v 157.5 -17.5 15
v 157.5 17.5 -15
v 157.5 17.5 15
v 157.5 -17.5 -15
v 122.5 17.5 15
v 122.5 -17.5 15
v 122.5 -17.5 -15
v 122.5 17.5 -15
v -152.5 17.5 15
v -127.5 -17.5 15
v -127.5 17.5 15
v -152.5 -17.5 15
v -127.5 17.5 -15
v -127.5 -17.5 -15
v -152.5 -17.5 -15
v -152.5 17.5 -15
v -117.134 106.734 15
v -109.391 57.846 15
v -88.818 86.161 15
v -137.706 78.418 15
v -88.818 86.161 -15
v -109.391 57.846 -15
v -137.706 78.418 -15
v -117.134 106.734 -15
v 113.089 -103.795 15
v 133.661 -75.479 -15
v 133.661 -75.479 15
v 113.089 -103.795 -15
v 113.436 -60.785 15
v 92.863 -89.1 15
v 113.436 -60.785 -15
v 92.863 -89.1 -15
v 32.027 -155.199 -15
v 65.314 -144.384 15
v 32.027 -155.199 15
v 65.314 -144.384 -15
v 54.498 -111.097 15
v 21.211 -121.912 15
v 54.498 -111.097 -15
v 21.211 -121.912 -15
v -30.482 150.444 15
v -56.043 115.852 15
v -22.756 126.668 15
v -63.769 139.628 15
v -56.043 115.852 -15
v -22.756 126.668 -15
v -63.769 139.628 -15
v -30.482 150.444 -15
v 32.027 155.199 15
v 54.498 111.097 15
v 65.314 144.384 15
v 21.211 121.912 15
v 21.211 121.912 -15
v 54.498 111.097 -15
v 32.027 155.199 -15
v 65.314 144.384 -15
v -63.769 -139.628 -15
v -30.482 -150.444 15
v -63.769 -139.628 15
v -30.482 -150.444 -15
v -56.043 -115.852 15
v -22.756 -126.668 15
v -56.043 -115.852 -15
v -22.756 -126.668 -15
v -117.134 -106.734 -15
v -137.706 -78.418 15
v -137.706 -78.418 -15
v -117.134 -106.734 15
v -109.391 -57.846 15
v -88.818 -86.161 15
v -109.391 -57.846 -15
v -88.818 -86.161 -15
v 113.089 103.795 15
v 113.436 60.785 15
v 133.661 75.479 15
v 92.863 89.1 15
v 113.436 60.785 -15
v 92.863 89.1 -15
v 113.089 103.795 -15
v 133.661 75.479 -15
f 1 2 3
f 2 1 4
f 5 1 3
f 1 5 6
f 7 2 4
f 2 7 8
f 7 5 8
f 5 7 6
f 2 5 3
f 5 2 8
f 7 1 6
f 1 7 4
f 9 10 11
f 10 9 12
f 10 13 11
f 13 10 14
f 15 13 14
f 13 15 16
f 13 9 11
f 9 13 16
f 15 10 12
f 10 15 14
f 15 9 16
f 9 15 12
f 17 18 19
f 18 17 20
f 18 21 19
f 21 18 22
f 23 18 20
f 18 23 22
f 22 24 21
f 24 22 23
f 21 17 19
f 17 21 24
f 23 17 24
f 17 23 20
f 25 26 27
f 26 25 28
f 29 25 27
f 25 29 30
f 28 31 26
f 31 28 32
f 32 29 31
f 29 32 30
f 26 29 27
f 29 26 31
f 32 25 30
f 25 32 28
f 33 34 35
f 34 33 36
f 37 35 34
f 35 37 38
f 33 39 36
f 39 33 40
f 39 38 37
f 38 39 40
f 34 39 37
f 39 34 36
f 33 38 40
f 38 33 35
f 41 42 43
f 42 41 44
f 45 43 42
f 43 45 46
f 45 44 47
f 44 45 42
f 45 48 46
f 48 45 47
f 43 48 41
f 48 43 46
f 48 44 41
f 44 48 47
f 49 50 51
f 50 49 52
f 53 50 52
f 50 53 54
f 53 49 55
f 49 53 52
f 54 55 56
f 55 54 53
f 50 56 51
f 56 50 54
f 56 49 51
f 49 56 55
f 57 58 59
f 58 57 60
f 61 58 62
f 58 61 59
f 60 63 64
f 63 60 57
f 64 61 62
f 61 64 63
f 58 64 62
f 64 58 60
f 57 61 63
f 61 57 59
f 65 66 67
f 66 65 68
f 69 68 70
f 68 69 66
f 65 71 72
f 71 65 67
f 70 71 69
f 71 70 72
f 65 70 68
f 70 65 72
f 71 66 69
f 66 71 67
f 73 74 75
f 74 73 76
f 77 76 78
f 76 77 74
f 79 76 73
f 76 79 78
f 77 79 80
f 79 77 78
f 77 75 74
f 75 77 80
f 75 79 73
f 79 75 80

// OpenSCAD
golden_ratio = (1+sqrt(5))/2;

BaseWidth = 200;
ChamberWidth=BaseWidth/2.62;
BasePlateThickness=3;
WallWidth=3;
WallHeight=20;
Dihedral_angle=116.56505;

module Penta_part(r,h) {
polyhedron(
	points=[
		[0,0,0],
		[sin(72*0)*r, cos(72*0)*r, 0],
		[sin(72*1)*r, cos(72*1)*r, 0],
		[0,0,h],
		[sin(72*0)*r, cos(72*0)*r, h],
		[sin(72*1)*r, cos(72*1)*r, h]
	],
	faces=[
		[0,1,2],
		[0,1,4,3],
		[1,2,5,4],
		[2,0,3,5],
		[3,4,5]
	]
);
}

module Penta_segment(r, h) {
polyhedron(
	points=[
		[sin(72*1)*r, cos(72*1)*r, 0],
		[sin(72*2)*r, cos(72*2)*r, 0],
		[sin(72*3)*r, cos(72*3)*r, 0],
		[sin(72*4)*r, cos(72*4)*r, 0],
		[sin(72*1)*r, cos(72*1)*r, h],
		[sin(72*2)*r, cos(72*2)*r, h],
		[sin(72*3)*r, cos(72*3)*r, h],
		[sin(72*4)*r, cos(72*4)*r, h]
	], 
	faces=[
		[0,1,2,3],
		[0,1,5,4],
		[1,2,6,5],
		[2,3,7,6],
		[3,0,4,7],
		[4,5,6,7],
	]
);
}

module Penta(r,h) { 
// r = (outer) Radius of the penta
// h = height of the penta. 
	for (i=[0:4]) {
		rotate(i*72, 0,0) Penta_part(r,h);
	}
}

module Tablet() {
	Twidth=190;
	Theight=240;
	Tdepth=15;
	translate([-Twidth, 0,0]) cube([Twidth, Theight, Tdepth]);
}

module Base() {
	rotate([0,0,72/2]) union() {
		BasePlate();
		BaseWalls();
	}
}

module BasePlate() {
	//difference() {
		Penta(BaseWidth,BasePlateThickness);
	//	cube([10,10,10], center=true);
		color("Purple") translate([0,0,-0.1]) rotate([0,0,72/2]) Penta(ChamberWidth+ChamberWidth*1.18*cos(180-Dihedral_angle),BasePlateThickness+0.2);
	//}
}

module BaseWalls() {
	render() difference() {
		Penta(BaseWidth,WallHeight);
		Penta(BaseWidth-WallWidth,WallHeight);
	}
}

module PSU() {
	PsuX=150;
	PsuY=150;
	PsuZ=100;
	translate([-PsuX/2,ChamberWidth,-PsuZ]) cube([PsuX, PsuY, PsuZ]);
}

module LaserPCB() {
	color("Green") cube([50,50,30], center=true);
}
module LaserDiode() {
	color("Red") cube([35,35,30], center=true);
}
module LaserSink() {
	color("Blue") cube([25,35,30], center=true);
}

module Integration() {
	Base();
	color("Blue") PSU();
	translate([-ChamberWidth,0,WallHeight]) rotate([80,0,0]) Tablet();
}


module Chamber() {
	//translate([0,0,5]) 
	rotate([0,0,72/2]) color("Pink") Penta(ChamberWidth, 3);
	for(i=[0:4]) {
		rotate([0,0,i*72]) translate([0,ChamberWidth*0.81,0]) rotate([180-116.56, 0, 0]) translate([0,ChamberWidth*0.81,0]) Penta_segment(ChamberWidth,3);
	}
}

BasePlate();
//rotate([0,0,0]) translate([BaseWidth,0,0]) LaserPCB();

for(i=[0,72,144,216,288]) {
	rotate([0,0,72*i]) translate([BaseWidth*0.70,0,0]) LaserDiode();
	rotate([0,0,72*i+180]) translate([BaseWidth*0.70,0,0]) LaserSink();
}
//Penta(BaseWidth,BasePlateThickness);

translate([0,0,-ChamberWidth*1.18*sin(116.56)]) Chamber();

//translate([]) LaserPCB();

//Integration();
